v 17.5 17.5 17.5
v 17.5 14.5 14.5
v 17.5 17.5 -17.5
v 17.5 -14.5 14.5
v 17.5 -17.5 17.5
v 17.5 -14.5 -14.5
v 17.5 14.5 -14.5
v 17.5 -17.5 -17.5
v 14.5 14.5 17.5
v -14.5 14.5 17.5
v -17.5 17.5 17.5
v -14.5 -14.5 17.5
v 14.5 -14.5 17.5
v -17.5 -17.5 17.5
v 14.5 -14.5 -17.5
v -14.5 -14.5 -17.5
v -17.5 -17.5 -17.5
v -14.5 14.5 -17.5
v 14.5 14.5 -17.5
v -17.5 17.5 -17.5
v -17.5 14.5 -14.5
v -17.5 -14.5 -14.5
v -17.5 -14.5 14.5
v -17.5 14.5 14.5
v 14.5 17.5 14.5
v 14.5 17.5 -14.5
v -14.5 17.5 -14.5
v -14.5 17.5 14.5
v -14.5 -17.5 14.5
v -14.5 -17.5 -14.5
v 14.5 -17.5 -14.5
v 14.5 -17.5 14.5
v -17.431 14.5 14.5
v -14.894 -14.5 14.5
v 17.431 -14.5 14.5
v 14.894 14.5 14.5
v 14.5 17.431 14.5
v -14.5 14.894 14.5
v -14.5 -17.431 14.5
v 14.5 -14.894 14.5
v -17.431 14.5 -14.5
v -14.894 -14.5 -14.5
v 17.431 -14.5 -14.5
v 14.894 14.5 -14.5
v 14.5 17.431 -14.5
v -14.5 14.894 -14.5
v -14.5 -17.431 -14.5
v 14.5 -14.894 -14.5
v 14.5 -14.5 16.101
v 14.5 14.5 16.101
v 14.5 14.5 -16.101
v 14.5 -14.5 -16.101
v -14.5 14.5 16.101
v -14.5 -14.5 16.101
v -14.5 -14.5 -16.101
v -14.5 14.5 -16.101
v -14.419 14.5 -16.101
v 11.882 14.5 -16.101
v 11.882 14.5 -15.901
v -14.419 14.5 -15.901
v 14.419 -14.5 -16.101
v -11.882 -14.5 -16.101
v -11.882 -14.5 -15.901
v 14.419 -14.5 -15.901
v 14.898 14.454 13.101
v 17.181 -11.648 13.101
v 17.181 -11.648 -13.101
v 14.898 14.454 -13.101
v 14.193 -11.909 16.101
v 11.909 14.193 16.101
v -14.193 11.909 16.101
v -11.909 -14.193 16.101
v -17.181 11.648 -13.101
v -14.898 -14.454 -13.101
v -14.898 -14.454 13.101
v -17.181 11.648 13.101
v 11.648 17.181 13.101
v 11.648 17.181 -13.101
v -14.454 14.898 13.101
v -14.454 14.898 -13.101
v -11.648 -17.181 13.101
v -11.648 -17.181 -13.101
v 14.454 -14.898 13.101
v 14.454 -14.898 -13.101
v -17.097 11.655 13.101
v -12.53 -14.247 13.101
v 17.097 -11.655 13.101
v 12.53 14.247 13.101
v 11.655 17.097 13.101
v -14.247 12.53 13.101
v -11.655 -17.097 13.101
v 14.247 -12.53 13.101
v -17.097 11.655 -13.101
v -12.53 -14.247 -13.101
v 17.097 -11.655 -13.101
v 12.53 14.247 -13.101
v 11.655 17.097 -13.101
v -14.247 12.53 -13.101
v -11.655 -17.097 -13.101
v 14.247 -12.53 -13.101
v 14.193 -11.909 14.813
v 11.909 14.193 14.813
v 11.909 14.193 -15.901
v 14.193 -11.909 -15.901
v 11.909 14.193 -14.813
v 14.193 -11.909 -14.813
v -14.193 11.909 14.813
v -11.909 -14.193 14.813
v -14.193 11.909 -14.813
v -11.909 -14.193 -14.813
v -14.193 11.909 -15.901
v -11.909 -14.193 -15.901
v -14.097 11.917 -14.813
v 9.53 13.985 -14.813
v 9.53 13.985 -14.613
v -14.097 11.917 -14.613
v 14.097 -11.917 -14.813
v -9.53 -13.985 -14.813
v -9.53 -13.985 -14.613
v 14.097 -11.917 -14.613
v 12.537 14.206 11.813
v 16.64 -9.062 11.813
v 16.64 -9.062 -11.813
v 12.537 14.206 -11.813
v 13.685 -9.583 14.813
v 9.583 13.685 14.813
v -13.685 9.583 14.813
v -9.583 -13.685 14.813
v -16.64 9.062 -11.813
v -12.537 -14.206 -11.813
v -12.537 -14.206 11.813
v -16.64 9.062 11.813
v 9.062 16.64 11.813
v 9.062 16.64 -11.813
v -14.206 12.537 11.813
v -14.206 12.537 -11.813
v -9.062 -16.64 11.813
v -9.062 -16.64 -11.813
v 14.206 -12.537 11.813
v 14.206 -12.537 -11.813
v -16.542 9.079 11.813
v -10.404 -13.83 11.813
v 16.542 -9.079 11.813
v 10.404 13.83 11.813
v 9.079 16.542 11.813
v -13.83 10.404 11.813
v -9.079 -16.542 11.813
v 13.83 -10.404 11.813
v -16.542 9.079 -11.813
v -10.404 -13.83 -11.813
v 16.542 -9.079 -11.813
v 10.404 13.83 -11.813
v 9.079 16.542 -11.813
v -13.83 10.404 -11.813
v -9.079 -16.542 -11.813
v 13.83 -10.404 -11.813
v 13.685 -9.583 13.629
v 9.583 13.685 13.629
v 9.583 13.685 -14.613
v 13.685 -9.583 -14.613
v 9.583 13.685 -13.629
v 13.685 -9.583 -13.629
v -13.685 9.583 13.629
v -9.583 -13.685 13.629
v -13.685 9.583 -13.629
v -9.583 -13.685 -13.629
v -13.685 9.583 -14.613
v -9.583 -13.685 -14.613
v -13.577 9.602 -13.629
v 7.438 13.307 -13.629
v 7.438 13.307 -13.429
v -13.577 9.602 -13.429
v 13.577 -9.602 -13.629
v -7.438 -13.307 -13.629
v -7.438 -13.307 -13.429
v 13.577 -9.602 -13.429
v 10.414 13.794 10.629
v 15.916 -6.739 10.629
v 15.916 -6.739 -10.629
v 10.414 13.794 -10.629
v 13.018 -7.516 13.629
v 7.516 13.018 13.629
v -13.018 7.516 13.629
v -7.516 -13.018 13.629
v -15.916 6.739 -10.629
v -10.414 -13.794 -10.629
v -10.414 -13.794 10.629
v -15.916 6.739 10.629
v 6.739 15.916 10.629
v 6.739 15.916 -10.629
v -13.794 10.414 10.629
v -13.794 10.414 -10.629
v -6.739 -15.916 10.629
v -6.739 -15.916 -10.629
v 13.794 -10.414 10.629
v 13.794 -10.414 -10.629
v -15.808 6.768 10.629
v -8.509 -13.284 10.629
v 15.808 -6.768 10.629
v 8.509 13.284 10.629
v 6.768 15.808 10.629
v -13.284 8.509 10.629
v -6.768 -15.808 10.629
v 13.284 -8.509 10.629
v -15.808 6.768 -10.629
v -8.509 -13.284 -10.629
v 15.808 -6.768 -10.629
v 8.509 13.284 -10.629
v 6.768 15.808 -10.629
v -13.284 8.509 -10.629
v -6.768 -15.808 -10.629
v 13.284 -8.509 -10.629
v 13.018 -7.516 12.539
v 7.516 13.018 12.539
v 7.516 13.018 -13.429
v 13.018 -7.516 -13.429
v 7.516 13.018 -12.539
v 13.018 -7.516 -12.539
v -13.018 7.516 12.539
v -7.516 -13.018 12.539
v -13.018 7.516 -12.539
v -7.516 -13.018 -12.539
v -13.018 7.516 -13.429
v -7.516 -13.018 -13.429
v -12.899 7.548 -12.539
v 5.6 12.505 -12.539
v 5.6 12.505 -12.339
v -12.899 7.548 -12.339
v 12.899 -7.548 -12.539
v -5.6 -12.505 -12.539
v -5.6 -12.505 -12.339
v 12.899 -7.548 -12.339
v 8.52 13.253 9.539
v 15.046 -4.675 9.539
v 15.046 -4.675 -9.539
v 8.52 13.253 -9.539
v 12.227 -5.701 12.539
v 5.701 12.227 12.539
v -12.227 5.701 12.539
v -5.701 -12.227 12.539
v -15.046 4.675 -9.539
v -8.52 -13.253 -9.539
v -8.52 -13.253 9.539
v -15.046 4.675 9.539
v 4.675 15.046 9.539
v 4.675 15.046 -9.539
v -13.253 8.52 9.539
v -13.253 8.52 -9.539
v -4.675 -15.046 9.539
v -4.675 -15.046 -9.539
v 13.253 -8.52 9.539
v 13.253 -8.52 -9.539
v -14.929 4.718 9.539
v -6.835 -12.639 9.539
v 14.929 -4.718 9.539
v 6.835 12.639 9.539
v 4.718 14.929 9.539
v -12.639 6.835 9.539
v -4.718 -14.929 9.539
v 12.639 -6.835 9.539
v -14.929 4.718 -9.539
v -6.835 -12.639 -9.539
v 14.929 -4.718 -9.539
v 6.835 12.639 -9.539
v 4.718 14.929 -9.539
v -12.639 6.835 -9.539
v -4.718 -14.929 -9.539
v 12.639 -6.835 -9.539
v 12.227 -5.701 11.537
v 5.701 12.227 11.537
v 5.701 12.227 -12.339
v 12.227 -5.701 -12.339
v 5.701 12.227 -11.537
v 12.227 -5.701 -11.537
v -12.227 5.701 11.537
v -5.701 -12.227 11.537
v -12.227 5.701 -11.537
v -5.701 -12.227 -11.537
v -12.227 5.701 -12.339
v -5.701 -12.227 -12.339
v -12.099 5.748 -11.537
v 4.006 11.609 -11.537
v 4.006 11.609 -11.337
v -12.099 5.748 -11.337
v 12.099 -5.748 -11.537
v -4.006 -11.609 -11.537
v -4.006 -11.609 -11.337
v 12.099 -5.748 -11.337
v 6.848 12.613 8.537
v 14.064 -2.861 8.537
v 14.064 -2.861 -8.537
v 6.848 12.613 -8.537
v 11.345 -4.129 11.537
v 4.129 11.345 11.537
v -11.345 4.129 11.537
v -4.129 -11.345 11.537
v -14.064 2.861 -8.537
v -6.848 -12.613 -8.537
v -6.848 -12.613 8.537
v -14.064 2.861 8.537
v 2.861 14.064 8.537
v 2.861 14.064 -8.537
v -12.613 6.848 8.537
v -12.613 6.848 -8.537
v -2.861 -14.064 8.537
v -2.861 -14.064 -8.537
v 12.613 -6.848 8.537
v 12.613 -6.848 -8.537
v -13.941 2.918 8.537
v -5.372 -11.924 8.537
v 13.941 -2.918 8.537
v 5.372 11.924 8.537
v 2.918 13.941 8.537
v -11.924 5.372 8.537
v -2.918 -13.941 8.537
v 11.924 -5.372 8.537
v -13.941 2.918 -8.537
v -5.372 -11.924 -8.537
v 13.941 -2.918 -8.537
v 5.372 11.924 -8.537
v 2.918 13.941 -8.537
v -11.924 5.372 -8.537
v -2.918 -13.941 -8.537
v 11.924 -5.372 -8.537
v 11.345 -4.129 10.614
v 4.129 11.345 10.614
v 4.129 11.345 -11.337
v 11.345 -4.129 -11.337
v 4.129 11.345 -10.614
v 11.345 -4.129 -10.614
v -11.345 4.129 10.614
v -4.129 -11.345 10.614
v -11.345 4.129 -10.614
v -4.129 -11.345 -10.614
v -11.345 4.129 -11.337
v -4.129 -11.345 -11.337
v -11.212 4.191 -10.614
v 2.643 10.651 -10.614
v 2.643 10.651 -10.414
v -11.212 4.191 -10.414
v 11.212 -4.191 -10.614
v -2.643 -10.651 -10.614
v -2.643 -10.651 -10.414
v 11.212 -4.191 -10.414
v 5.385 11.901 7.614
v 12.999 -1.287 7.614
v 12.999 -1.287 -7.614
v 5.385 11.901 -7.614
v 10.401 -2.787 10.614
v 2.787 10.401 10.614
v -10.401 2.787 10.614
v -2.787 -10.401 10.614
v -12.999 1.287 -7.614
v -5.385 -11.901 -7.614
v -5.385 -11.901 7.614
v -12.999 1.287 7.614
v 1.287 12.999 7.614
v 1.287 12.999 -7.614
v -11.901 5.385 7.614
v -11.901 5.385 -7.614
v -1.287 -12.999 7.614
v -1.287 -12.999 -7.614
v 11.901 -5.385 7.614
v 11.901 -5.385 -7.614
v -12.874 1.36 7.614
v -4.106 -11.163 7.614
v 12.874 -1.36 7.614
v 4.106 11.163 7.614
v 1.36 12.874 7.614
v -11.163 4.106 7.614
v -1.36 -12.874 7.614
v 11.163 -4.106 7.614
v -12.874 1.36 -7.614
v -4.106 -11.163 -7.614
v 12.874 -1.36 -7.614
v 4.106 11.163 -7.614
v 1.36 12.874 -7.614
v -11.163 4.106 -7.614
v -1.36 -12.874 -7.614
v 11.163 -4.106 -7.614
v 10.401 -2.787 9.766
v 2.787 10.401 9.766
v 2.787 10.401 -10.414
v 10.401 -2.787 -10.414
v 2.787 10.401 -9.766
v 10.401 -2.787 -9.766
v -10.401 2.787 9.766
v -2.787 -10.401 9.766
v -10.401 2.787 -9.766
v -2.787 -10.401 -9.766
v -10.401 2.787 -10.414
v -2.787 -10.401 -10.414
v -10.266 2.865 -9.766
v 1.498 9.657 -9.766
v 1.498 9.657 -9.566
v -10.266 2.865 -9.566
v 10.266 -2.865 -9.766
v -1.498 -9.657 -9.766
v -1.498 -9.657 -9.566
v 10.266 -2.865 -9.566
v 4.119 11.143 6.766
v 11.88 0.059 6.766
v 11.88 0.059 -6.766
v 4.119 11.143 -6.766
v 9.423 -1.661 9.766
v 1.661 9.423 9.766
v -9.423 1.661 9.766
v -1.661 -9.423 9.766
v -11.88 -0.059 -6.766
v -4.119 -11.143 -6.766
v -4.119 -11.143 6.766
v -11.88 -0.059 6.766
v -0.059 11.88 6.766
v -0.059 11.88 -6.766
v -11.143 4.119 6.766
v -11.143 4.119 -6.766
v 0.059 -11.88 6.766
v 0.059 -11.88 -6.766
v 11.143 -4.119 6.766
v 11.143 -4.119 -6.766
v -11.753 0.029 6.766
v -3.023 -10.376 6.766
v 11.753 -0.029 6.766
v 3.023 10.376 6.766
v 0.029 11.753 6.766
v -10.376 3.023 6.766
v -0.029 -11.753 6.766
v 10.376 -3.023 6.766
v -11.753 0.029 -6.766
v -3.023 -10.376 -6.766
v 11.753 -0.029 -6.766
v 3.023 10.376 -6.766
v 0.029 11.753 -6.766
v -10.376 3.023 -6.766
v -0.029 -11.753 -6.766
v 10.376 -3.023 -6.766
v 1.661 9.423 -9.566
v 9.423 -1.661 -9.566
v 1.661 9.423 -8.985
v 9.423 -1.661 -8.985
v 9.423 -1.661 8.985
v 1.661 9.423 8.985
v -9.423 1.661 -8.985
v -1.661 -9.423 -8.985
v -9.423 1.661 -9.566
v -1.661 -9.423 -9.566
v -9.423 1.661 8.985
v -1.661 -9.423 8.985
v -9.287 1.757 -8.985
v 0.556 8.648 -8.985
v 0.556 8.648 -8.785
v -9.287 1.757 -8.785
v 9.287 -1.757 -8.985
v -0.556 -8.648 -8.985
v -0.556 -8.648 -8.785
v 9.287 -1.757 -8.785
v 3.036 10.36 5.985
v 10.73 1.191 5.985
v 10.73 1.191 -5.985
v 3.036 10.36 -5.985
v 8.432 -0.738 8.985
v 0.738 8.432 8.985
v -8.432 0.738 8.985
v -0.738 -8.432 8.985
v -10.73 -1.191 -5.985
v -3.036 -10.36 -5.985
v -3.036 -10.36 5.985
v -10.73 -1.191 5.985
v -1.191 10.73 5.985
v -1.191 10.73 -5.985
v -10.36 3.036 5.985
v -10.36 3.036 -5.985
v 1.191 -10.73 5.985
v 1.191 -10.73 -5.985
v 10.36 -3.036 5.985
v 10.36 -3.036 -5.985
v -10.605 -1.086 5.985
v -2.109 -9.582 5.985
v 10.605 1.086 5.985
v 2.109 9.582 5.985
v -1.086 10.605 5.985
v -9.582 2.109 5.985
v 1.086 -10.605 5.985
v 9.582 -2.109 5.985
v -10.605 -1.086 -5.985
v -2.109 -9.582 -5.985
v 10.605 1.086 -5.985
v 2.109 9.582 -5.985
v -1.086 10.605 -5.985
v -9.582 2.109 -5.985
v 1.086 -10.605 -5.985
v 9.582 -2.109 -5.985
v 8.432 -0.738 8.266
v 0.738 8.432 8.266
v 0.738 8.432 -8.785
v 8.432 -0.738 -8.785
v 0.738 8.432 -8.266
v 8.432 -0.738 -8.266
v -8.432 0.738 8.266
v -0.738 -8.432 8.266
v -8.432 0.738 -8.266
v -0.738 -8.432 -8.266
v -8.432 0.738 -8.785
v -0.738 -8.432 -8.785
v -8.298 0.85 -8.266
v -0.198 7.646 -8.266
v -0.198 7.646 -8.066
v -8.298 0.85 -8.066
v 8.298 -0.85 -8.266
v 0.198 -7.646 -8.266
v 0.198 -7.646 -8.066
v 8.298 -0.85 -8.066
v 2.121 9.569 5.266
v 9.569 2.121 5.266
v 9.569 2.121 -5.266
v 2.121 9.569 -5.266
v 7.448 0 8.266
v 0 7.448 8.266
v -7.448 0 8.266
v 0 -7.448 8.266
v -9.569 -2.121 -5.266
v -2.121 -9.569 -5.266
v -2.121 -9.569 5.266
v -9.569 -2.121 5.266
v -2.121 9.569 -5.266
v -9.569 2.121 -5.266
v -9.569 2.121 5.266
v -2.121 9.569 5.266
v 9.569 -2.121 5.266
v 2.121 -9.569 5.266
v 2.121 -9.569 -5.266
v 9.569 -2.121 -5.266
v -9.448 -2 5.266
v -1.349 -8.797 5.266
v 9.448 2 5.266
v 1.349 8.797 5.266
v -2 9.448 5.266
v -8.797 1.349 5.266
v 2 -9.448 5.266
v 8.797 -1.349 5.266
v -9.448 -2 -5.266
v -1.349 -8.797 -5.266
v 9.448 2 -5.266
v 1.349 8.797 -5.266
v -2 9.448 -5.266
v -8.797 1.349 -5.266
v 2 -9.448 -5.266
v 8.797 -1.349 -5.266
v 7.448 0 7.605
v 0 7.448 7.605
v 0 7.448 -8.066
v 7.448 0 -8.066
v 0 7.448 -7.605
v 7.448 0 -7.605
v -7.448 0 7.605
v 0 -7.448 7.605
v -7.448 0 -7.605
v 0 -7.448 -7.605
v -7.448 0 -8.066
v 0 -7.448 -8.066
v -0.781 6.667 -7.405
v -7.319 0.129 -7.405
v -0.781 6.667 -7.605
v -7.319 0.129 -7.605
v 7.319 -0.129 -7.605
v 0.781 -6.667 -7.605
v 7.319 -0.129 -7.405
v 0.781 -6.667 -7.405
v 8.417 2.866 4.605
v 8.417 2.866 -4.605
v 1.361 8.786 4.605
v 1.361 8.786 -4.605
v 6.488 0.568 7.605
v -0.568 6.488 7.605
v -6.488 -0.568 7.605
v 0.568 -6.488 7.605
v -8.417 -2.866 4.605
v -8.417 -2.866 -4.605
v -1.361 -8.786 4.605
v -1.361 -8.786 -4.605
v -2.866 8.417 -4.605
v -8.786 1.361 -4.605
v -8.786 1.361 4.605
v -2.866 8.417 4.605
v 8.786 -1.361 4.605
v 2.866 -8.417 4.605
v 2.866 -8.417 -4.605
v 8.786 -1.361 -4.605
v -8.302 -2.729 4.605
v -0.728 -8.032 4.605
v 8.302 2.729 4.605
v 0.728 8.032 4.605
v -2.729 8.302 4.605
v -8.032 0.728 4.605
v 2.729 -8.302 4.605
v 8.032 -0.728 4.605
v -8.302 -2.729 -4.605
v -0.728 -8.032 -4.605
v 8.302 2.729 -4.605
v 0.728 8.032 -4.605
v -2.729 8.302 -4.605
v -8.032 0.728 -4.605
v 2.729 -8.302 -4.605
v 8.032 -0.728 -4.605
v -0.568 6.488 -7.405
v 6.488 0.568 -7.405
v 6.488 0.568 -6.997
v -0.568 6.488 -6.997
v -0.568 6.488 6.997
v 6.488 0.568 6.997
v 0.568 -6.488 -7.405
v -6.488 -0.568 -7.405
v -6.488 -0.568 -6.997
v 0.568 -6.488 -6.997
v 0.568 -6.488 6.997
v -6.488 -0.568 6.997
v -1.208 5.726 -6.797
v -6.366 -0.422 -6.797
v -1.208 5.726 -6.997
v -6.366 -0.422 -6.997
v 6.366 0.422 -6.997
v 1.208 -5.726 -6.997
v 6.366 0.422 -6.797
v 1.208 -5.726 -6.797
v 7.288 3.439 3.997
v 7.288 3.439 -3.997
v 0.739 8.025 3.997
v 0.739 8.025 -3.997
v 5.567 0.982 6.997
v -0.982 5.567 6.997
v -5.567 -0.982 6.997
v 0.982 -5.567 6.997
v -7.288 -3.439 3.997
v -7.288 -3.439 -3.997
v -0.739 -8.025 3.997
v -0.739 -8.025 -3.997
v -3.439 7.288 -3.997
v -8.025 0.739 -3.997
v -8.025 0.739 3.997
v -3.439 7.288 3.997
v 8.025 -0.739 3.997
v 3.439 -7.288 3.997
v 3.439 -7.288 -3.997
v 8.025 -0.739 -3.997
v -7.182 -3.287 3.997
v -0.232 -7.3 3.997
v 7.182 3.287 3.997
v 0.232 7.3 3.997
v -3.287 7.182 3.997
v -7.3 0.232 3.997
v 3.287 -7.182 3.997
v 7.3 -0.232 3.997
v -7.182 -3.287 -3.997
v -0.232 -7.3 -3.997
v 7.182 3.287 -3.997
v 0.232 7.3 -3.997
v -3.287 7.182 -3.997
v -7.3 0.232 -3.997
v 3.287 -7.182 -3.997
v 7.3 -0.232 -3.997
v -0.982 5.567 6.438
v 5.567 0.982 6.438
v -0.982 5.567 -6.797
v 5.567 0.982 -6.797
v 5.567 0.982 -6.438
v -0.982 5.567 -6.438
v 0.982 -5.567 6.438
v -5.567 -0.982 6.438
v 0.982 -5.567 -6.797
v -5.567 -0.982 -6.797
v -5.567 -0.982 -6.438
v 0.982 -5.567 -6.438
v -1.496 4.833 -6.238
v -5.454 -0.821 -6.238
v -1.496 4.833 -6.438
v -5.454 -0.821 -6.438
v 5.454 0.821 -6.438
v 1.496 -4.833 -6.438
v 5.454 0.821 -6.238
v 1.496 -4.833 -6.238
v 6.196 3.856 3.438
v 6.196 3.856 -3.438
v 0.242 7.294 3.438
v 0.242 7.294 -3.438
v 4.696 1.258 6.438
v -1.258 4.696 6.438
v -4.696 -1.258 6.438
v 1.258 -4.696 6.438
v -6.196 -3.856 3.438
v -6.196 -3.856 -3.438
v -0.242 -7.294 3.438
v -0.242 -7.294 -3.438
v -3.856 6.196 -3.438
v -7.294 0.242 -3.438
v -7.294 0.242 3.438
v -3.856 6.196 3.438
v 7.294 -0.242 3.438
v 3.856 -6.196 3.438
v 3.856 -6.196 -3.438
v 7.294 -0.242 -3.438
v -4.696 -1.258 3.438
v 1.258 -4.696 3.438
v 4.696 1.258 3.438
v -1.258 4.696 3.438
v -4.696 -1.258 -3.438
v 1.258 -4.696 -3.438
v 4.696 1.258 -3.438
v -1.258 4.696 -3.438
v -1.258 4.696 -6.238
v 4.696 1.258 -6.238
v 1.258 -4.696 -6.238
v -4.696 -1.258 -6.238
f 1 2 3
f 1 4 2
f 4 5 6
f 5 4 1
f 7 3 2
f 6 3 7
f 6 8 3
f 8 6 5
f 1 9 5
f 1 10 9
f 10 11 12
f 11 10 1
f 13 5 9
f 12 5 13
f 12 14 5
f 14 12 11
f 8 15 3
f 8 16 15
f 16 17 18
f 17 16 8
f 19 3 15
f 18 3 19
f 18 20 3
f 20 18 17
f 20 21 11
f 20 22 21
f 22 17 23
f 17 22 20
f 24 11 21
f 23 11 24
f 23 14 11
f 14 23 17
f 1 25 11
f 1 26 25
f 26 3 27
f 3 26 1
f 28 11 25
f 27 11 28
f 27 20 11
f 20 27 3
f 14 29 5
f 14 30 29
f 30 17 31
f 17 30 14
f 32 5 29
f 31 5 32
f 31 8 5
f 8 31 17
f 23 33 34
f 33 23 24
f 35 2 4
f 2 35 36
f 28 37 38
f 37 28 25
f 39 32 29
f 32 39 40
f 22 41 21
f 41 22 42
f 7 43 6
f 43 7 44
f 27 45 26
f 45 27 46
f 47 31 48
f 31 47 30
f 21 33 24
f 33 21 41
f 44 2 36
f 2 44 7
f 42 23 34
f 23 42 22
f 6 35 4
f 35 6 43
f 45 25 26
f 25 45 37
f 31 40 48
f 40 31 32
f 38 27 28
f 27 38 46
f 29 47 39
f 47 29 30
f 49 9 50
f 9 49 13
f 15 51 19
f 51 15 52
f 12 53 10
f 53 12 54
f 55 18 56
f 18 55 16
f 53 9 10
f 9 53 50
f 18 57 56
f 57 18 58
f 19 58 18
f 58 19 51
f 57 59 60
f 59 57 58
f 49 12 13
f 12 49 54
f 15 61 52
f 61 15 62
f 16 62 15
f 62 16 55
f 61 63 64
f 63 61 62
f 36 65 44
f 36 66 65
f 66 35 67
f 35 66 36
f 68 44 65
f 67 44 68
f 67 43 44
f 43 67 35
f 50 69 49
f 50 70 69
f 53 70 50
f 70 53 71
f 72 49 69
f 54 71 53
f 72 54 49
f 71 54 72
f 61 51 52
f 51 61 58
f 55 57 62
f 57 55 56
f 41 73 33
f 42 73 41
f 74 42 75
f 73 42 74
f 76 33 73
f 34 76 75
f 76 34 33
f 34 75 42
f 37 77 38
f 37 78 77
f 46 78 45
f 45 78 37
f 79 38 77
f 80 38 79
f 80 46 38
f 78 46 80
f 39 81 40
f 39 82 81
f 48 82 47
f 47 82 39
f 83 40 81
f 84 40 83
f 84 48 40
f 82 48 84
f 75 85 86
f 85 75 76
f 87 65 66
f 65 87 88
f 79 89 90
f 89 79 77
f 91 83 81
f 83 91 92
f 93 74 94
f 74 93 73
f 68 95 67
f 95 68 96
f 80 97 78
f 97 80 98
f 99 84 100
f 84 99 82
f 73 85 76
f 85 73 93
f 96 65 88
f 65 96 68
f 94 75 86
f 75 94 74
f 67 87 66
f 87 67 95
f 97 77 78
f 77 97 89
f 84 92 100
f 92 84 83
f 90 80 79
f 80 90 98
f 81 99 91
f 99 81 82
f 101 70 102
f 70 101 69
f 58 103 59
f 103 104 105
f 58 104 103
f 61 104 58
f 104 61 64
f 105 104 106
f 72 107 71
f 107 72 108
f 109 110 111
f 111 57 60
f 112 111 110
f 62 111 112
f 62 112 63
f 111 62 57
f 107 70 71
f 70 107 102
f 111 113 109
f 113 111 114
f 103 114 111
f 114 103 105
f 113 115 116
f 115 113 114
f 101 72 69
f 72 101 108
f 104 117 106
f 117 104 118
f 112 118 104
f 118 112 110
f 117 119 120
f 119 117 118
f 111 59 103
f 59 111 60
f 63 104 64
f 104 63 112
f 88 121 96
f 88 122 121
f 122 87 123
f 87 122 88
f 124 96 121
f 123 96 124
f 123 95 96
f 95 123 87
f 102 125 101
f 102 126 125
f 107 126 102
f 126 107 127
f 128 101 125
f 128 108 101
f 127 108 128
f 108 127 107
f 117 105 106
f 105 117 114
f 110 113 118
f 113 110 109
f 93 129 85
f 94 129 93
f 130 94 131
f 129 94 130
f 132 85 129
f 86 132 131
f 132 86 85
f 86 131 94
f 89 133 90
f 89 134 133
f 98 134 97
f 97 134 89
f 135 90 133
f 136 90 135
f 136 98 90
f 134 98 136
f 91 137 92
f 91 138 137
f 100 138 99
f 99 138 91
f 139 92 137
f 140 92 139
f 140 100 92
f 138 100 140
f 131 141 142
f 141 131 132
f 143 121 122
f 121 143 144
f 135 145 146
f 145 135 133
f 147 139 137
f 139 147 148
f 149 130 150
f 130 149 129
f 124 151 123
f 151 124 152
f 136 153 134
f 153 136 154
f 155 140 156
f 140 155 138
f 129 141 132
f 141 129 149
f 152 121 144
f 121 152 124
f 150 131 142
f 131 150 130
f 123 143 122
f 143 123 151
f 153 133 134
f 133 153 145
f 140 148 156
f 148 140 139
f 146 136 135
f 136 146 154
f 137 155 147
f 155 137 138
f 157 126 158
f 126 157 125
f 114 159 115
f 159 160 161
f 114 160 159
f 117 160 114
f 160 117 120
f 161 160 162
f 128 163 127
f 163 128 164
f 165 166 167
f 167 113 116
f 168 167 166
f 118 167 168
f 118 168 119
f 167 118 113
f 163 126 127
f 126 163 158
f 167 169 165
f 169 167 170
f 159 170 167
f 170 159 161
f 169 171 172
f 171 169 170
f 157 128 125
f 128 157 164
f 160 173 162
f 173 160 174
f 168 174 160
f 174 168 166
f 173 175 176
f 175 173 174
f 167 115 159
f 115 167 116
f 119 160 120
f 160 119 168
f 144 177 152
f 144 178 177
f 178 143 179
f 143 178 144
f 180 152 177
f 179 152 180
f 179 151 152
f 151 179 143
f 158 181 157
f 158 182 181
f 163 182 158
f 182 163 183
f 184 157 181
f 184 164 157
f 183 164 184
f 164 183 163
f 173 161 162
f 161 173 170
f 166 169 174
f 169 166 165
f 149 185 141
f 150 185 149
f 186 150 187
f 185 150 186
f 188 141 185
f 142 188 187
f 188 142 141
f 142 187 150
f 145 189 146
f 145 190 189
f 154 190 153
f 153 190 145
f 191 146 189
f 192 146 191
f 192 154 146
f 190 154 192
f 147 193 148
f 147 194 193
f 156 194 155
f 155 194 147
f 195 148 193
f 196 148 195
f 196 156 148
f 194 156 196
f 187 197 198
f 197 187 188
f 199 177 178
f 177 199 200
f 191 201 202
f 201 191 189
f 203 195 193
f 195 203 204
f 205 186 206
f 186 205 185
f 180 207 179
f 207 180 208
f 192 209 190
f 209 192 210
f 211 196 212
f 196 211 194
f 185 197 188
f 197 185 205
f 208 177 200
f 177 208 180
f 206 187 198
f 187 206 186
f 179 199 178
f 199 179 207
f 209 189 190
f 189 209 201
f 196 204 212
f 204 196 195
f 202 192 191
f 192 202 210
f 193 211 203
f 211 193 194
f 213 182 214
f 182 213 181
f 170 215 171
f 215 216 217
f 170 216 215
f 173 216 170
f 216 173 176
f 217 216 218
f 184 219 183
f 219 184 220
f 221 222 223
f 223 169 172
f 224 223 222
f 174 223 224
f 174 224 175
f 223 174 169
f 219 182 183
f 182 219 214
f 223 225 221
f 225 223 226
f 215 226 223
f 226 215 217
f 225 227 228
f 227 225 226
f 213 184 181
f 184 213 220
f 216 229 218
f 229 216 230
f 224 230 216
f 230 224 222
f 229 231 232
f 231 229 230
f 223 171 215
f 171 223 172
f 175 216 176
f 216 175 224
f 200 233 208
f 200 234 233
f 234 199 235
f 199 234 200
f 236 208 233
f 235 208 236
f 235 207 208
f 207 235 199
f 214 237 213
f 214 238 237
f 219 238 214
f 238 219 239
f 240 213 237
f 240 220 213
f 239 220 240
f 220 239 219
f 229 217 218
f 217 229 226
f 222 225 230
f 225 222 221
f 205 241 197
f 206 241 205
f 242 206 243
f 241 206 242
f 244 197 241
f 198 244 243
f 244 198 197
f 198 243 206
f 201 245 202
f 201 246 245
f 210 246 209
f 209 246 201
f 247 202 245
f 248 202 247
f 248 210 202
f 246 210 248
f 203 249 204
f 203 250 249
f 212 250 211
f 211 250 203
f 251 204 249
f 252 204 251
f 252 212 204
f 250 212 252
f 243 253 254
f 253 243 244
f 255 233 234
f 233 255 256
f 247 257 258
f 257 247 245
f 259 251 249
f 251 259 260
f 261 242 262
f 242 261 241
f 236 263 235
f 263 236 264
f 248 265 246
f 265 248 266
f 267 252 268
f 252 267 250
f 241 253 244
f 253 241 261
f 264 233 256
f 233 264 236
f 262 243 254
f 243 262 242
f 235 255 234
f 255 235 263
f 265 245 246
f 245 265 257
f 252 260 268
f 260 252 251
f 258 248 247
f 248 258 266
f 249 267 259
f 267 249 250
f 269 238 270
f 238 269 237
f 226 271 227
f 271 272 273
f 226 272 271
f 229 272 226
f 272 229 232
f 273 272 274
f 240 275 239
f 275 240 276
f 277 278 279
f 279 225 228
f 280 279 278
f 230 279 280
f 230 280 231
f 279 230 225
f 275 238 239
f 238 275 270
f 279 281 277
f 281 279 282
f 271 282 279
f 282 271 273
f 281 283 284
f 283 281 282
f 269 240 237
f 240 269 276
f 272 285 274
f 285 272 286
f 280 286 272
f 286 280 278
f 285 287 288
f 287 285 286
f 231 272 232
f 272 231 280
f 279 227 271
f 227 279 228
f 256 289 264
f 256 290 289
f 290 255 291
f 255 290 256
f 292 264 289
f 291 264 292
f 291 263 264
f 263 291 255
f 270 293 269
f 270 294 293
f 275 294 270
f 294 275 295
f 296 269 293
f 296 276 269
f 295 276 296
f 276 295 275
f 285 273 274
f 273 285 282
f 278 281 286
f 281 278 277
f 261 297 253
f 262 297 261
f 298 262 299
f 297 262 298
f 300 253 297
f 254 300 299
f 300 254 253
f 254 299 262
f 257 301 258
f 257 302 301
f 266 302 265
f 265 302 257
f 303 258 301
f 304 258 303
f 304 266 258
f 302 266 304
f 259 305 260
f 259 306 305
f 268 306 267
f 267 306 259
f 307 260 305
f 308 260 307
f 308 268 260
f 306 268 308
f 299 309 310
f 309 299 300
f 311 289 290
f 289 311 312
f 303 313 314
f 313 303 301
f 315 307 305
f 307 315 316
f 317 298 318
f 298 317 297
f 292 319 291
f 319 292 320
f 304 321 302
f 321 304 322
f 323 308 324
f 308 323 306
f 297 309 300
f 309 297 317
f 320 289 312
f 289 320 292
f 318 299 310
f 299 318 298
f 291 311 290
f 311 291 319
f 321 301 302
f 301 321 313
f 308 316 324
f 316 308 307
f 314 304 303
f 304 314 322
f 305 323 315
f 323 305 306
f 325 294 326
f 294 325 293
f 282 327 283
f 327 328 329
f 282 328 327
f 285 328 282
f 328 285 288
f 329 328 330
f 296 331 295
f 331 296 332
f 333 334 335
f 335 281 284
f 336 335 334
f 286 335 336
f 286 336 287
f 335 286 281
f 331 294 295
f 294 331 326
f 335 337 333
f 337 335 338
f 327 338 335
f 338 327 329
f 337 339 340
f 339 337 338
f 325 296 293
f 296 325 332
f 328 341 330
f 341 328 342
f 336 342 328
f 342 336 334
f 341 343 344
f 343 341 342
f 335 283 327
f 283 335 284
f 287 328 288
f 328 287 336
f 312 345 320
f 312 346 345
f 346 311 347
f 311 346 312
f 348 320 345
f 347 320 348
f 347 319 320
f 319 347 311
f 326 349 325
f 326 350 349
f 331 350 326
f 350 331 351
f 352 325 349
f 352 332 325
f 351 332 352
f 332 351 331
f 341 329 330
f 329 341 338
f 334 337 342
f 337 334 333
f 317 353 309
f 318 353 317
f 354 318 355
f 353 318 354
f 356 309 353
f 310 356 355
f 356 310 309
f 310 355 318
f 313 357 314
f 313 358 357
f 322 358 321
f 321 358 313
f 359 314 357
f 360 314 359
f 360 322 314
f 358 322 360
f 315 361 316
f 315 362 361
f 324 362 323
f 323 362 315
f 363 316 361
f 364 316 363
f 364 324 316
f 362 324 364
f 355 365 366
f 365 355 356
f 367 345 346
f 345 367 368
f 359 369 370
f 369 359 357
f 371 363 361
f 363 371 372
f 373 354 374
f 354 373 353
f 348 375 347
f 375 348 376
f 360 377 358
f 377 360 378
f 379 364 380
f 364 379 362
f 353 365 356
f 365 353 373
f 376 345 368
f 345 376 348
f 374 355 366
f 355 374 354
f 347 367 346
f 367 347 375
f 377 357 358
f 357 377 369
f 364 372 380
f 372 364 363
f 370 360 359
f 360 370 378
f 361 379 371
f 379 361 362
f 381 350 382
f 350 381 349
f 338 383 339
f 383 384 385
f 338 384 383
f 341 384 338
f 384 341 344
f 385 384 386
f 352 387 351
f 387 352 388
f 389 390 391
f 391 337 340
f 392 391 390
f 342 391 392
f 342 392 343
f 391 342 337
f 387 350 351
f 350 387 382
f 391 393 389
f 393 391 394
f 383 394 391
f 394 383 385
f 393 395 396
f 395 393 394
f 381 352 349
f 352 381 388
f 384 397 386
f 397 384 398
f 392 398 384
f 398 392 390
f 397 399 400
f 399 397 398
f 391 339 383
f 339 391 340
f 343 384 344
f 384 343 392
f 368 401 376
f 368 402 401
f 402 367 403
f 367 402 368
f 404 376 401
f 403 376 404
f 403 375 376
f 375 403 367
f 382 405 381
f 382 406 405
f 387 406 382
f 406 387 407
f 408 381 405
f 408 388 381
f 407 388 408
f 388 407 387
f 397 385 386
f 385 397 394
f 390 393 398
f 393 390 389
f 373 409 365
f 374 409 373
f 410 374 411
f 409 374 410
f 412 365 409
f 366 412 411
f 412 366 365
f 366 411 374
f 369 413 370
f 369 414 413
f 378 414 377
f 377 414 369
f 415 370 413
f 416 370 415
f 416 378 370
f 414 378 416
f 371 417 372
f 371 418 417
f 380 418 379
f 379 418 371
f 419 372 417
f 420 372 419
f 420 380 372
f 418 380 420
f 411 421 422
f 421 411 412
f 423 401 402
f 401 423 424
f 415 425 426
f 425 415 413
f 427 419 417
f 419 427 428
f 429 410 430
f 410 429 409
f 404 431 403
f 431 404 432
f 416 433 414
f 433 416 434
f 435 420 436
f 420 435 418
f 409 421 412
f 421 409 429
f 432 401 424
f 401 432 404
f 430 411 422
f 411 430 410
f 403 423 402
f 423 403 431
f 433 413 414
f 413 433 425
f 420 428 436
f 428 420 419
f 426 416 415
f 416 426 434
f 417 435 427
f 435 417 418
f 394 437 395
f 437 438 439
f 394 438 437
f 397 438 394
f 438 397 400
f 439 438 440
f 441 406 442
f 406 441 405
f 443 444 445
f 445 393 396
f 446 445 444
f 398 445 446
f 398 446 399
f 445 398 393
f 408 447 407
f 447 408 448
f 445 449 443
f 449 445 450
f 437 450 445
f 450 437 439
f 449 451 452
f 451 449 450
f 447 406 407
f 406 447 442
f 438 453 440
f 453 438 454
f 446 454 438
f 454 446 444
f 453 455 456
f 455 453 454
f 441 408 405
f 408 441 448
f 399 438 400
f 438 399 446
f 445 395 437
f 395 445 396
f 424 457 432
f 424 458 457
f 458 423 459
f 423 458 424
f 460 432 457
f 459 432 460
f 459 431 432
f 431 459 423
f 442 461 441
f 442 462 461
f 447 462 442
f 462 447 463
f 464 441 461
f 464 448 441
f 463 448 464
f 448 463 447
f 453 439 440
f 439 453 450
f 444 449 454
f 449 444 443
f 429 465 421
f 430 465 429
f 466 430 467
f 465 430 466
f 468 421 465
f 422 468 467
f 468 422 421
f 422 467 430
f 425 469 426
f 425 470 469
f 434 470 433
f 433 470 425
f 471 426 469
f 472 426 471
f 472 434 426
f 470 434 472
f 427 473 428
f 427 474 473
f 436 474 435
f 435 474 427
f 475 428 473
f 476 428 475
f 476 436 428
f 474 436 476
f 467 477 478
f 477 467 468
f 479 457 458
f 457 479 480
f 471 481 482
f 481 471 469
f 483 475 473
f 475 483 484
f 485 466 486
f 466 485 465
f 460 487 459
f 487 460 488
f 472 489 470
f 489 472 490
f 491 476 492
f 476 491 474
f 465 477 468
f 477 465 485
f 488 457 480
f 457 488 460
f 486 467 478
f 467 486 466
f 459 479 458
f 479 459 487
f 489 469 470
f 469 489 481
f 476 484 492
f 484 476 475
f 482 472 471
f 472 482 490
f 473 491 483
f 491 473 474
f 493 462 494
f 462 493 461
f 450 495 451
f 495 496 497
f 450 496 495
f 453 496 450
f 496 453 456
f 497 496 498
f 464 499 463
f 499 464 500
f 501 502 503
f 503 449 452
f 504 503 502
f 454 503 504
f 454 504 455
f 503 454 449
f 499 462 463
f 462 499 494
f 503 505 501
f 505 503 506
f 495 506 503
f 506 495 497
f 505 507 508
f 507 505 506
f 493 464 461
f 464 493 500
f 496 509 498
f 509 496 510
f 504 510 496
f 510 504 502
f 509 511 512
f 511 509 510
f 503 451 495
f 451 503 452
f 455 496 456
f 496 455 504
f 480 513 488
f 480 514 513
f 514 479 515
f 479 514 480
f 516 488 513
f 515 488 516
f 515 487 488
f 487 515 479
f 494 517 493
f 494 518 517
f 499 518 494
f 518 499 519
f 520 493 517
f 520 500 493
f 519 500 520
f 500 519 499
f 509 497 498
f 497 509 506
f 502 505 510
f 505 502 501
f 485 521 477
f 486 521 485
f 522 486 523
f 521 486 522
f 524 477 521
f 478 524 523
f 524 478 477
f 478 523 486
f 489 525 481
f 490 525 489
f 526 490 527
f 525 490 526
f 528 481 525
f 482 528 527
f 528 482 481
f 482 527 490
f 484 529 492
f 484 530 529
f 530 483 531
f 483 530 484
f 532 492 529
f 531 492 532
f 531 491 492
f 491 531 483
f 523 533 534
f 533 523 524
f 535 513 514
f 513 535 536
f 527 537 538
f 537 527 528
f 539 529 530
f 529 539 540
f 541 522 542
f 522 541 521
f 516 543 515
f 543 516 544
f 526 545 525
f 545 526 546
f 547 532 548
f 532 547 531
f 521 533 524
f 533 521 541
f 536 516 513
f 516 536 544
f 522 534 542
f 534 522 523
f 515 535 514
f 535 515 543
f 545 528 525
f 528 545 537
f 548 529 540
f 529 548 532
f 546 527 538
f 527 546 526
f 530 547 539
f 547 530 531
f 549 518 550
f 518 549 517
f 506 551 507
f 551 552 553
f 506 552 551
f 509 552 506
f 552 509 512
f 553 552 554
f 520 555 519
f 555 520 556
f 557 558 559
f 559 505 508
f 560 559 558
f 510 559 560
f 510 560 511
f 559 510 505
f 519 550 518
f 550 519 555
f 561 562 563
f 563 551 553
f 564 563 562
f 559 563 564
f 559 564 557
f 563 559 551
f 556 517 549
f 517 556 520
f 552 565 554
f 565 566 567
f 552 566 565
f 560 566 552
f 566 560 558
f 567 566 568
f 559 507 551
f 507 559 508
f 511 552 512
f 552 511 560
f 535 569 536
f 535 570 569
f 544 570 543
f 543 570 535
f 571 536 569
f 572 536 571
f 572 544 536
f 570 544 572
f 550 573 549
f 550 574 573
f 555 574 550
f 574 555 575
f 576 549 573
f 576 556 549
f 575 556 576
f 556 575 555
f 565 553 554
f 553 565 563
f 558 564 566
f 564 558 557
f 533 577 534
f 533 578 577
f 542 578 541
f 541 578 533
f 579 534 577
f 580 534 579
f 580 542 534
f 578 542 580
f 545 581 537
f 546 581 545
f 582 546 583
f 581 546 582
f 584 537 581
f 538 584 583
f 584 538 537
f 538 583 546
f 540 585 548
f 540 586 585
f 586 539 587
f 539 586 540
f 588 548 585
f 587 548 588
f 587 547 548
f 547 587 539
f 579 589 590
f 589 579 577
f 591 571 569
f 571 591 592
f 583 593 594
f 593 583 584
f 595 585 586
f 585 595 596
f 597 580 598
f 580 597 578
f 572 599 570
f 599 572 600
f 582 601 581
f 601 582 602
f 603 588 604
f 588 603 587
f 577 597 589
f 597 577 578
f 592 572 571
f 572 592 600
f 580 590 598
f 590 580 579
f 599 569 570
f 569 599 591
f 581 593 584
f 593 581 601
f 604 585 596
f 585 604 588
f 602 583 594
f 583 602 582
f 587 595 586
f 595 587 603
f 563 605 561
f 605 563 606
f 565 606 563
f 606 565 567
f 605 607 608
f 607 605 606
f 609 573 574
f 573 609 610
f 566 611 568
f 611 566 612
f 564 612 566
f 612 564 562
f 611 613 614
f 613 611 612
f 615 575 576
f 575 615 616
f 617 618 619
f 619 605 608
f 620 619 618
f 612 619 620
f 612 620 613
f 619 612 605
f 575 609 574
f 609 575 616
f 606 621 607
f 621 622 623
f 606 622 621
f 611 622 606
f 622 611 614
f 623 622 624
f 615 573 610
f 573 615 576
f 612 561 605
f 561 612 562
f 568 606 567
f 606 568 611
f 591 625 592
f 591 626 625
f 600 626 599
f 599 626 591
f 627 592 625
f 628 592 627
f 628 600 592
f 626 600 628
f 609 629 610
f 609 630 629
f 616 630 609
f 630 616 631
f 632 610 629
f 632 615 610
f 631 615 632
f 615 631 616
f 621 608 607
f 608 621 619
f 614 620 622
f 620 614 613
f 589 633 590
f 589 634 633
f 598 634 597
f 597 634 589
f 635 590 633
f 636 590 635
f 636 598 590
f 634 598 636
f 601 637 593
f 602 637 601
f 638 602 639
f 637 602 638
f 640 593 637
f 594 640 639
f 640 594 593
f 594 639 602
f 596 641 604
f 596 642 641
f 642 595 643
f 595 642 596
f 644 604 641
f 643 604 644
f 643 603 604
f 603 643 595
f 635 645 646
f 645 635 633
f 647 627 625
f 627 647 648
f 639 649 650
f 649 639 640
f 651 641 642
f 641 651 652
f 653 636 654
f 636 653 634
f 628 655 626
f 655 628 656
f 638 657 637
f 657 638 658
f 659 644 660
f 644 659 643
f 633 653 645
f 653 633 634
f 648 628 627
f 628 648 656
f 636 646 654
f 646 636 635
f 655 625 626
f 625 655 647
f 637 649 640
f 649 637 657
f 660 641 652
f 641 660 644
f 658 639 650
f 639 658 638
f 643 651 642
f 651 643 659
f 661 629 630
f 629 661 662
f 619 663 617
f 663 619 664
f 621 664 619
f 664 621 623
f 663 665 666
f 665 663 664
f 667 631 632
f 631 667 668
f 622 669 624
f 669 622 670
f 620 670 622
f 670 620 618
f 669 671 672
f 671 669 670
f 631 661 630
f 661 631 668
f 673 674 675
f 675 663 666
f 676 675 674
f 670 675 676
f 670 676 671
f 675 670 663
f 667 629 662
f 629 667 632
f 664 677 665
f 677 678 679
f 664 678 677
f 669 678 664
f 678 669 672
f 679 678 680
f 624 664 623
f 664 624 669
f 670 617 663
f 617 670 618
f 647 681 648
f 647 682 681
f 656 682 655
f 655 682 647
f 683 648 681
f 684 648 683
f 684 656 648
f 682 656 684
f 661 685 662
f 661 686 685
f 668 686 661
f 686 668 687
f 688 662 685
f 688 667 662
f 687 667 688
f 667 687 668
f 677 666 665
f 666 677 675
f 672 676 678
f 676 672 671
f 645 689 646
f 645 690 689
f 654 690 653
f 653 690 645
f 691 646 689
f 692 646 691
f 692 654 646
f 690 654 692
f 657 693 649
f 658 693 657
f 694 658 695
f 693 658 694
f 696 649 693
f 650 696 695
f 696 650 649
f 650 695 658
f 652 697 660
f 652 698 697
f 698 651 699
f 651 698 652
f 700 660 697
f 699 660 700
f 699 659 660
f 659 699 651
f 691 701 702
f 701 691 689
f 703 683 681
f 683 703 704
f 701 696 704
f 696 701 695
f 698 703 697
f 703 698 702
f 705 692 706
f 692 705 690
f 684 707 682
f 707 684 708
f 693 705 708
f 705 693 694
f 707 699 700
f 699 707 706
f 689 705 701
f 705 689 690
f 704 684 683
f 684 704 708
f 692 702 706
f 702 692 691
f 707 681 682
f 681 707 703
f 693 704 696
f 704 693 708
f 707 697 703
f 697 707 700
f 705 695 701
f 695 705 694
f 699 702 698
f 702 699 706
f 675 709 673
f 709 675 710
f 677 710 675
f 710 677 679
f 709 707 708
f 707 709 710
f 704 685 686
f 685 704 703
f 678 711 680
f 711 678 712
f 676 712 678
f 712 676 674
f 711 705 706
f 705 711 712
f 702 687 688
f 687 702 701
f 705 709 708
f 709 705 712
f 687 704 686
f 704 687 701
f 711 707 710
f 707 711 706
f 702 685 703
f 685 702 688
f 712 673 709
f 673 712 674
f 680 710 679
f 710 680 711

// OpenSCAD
// Spiral Cube by P. Bauermeister, January 2018
// See https://www.instructables.com/

WALL_THICKNESS = 3;
SIZE = 35;
STEPS = 12;
TOTAL_ROTATION = 60;
LAYER = 0.2;

module make_cube_edges(size, rotation, etch_base) {
    thickness = WALL_THICKNESS;
    d1 = size - thickness*2; // to keep walls
    d2 = size + thickness; // to dig face
    rotate([0, 0, rotation])
    difference() {
        cube([size, size, size], true); // full cube
        cube([d2, d1, d1], true); // dig along X axis
        cube([d1, d2, d1], true); // dig along Y axis
        cube([d1, d1, d2], true); // dig along Z axis
        
        if (etch_base)
            translate([0, 0, -size/2])
            cube([d1, d2, LAYER*2], true); // dig along Z axis
    }        
}

for (i=[0:STEPS]) {
    make_cube_edges(SIZE / exp(i/STEPS), i/STEPS * TOTAL_ROTATION, i>0);
}
